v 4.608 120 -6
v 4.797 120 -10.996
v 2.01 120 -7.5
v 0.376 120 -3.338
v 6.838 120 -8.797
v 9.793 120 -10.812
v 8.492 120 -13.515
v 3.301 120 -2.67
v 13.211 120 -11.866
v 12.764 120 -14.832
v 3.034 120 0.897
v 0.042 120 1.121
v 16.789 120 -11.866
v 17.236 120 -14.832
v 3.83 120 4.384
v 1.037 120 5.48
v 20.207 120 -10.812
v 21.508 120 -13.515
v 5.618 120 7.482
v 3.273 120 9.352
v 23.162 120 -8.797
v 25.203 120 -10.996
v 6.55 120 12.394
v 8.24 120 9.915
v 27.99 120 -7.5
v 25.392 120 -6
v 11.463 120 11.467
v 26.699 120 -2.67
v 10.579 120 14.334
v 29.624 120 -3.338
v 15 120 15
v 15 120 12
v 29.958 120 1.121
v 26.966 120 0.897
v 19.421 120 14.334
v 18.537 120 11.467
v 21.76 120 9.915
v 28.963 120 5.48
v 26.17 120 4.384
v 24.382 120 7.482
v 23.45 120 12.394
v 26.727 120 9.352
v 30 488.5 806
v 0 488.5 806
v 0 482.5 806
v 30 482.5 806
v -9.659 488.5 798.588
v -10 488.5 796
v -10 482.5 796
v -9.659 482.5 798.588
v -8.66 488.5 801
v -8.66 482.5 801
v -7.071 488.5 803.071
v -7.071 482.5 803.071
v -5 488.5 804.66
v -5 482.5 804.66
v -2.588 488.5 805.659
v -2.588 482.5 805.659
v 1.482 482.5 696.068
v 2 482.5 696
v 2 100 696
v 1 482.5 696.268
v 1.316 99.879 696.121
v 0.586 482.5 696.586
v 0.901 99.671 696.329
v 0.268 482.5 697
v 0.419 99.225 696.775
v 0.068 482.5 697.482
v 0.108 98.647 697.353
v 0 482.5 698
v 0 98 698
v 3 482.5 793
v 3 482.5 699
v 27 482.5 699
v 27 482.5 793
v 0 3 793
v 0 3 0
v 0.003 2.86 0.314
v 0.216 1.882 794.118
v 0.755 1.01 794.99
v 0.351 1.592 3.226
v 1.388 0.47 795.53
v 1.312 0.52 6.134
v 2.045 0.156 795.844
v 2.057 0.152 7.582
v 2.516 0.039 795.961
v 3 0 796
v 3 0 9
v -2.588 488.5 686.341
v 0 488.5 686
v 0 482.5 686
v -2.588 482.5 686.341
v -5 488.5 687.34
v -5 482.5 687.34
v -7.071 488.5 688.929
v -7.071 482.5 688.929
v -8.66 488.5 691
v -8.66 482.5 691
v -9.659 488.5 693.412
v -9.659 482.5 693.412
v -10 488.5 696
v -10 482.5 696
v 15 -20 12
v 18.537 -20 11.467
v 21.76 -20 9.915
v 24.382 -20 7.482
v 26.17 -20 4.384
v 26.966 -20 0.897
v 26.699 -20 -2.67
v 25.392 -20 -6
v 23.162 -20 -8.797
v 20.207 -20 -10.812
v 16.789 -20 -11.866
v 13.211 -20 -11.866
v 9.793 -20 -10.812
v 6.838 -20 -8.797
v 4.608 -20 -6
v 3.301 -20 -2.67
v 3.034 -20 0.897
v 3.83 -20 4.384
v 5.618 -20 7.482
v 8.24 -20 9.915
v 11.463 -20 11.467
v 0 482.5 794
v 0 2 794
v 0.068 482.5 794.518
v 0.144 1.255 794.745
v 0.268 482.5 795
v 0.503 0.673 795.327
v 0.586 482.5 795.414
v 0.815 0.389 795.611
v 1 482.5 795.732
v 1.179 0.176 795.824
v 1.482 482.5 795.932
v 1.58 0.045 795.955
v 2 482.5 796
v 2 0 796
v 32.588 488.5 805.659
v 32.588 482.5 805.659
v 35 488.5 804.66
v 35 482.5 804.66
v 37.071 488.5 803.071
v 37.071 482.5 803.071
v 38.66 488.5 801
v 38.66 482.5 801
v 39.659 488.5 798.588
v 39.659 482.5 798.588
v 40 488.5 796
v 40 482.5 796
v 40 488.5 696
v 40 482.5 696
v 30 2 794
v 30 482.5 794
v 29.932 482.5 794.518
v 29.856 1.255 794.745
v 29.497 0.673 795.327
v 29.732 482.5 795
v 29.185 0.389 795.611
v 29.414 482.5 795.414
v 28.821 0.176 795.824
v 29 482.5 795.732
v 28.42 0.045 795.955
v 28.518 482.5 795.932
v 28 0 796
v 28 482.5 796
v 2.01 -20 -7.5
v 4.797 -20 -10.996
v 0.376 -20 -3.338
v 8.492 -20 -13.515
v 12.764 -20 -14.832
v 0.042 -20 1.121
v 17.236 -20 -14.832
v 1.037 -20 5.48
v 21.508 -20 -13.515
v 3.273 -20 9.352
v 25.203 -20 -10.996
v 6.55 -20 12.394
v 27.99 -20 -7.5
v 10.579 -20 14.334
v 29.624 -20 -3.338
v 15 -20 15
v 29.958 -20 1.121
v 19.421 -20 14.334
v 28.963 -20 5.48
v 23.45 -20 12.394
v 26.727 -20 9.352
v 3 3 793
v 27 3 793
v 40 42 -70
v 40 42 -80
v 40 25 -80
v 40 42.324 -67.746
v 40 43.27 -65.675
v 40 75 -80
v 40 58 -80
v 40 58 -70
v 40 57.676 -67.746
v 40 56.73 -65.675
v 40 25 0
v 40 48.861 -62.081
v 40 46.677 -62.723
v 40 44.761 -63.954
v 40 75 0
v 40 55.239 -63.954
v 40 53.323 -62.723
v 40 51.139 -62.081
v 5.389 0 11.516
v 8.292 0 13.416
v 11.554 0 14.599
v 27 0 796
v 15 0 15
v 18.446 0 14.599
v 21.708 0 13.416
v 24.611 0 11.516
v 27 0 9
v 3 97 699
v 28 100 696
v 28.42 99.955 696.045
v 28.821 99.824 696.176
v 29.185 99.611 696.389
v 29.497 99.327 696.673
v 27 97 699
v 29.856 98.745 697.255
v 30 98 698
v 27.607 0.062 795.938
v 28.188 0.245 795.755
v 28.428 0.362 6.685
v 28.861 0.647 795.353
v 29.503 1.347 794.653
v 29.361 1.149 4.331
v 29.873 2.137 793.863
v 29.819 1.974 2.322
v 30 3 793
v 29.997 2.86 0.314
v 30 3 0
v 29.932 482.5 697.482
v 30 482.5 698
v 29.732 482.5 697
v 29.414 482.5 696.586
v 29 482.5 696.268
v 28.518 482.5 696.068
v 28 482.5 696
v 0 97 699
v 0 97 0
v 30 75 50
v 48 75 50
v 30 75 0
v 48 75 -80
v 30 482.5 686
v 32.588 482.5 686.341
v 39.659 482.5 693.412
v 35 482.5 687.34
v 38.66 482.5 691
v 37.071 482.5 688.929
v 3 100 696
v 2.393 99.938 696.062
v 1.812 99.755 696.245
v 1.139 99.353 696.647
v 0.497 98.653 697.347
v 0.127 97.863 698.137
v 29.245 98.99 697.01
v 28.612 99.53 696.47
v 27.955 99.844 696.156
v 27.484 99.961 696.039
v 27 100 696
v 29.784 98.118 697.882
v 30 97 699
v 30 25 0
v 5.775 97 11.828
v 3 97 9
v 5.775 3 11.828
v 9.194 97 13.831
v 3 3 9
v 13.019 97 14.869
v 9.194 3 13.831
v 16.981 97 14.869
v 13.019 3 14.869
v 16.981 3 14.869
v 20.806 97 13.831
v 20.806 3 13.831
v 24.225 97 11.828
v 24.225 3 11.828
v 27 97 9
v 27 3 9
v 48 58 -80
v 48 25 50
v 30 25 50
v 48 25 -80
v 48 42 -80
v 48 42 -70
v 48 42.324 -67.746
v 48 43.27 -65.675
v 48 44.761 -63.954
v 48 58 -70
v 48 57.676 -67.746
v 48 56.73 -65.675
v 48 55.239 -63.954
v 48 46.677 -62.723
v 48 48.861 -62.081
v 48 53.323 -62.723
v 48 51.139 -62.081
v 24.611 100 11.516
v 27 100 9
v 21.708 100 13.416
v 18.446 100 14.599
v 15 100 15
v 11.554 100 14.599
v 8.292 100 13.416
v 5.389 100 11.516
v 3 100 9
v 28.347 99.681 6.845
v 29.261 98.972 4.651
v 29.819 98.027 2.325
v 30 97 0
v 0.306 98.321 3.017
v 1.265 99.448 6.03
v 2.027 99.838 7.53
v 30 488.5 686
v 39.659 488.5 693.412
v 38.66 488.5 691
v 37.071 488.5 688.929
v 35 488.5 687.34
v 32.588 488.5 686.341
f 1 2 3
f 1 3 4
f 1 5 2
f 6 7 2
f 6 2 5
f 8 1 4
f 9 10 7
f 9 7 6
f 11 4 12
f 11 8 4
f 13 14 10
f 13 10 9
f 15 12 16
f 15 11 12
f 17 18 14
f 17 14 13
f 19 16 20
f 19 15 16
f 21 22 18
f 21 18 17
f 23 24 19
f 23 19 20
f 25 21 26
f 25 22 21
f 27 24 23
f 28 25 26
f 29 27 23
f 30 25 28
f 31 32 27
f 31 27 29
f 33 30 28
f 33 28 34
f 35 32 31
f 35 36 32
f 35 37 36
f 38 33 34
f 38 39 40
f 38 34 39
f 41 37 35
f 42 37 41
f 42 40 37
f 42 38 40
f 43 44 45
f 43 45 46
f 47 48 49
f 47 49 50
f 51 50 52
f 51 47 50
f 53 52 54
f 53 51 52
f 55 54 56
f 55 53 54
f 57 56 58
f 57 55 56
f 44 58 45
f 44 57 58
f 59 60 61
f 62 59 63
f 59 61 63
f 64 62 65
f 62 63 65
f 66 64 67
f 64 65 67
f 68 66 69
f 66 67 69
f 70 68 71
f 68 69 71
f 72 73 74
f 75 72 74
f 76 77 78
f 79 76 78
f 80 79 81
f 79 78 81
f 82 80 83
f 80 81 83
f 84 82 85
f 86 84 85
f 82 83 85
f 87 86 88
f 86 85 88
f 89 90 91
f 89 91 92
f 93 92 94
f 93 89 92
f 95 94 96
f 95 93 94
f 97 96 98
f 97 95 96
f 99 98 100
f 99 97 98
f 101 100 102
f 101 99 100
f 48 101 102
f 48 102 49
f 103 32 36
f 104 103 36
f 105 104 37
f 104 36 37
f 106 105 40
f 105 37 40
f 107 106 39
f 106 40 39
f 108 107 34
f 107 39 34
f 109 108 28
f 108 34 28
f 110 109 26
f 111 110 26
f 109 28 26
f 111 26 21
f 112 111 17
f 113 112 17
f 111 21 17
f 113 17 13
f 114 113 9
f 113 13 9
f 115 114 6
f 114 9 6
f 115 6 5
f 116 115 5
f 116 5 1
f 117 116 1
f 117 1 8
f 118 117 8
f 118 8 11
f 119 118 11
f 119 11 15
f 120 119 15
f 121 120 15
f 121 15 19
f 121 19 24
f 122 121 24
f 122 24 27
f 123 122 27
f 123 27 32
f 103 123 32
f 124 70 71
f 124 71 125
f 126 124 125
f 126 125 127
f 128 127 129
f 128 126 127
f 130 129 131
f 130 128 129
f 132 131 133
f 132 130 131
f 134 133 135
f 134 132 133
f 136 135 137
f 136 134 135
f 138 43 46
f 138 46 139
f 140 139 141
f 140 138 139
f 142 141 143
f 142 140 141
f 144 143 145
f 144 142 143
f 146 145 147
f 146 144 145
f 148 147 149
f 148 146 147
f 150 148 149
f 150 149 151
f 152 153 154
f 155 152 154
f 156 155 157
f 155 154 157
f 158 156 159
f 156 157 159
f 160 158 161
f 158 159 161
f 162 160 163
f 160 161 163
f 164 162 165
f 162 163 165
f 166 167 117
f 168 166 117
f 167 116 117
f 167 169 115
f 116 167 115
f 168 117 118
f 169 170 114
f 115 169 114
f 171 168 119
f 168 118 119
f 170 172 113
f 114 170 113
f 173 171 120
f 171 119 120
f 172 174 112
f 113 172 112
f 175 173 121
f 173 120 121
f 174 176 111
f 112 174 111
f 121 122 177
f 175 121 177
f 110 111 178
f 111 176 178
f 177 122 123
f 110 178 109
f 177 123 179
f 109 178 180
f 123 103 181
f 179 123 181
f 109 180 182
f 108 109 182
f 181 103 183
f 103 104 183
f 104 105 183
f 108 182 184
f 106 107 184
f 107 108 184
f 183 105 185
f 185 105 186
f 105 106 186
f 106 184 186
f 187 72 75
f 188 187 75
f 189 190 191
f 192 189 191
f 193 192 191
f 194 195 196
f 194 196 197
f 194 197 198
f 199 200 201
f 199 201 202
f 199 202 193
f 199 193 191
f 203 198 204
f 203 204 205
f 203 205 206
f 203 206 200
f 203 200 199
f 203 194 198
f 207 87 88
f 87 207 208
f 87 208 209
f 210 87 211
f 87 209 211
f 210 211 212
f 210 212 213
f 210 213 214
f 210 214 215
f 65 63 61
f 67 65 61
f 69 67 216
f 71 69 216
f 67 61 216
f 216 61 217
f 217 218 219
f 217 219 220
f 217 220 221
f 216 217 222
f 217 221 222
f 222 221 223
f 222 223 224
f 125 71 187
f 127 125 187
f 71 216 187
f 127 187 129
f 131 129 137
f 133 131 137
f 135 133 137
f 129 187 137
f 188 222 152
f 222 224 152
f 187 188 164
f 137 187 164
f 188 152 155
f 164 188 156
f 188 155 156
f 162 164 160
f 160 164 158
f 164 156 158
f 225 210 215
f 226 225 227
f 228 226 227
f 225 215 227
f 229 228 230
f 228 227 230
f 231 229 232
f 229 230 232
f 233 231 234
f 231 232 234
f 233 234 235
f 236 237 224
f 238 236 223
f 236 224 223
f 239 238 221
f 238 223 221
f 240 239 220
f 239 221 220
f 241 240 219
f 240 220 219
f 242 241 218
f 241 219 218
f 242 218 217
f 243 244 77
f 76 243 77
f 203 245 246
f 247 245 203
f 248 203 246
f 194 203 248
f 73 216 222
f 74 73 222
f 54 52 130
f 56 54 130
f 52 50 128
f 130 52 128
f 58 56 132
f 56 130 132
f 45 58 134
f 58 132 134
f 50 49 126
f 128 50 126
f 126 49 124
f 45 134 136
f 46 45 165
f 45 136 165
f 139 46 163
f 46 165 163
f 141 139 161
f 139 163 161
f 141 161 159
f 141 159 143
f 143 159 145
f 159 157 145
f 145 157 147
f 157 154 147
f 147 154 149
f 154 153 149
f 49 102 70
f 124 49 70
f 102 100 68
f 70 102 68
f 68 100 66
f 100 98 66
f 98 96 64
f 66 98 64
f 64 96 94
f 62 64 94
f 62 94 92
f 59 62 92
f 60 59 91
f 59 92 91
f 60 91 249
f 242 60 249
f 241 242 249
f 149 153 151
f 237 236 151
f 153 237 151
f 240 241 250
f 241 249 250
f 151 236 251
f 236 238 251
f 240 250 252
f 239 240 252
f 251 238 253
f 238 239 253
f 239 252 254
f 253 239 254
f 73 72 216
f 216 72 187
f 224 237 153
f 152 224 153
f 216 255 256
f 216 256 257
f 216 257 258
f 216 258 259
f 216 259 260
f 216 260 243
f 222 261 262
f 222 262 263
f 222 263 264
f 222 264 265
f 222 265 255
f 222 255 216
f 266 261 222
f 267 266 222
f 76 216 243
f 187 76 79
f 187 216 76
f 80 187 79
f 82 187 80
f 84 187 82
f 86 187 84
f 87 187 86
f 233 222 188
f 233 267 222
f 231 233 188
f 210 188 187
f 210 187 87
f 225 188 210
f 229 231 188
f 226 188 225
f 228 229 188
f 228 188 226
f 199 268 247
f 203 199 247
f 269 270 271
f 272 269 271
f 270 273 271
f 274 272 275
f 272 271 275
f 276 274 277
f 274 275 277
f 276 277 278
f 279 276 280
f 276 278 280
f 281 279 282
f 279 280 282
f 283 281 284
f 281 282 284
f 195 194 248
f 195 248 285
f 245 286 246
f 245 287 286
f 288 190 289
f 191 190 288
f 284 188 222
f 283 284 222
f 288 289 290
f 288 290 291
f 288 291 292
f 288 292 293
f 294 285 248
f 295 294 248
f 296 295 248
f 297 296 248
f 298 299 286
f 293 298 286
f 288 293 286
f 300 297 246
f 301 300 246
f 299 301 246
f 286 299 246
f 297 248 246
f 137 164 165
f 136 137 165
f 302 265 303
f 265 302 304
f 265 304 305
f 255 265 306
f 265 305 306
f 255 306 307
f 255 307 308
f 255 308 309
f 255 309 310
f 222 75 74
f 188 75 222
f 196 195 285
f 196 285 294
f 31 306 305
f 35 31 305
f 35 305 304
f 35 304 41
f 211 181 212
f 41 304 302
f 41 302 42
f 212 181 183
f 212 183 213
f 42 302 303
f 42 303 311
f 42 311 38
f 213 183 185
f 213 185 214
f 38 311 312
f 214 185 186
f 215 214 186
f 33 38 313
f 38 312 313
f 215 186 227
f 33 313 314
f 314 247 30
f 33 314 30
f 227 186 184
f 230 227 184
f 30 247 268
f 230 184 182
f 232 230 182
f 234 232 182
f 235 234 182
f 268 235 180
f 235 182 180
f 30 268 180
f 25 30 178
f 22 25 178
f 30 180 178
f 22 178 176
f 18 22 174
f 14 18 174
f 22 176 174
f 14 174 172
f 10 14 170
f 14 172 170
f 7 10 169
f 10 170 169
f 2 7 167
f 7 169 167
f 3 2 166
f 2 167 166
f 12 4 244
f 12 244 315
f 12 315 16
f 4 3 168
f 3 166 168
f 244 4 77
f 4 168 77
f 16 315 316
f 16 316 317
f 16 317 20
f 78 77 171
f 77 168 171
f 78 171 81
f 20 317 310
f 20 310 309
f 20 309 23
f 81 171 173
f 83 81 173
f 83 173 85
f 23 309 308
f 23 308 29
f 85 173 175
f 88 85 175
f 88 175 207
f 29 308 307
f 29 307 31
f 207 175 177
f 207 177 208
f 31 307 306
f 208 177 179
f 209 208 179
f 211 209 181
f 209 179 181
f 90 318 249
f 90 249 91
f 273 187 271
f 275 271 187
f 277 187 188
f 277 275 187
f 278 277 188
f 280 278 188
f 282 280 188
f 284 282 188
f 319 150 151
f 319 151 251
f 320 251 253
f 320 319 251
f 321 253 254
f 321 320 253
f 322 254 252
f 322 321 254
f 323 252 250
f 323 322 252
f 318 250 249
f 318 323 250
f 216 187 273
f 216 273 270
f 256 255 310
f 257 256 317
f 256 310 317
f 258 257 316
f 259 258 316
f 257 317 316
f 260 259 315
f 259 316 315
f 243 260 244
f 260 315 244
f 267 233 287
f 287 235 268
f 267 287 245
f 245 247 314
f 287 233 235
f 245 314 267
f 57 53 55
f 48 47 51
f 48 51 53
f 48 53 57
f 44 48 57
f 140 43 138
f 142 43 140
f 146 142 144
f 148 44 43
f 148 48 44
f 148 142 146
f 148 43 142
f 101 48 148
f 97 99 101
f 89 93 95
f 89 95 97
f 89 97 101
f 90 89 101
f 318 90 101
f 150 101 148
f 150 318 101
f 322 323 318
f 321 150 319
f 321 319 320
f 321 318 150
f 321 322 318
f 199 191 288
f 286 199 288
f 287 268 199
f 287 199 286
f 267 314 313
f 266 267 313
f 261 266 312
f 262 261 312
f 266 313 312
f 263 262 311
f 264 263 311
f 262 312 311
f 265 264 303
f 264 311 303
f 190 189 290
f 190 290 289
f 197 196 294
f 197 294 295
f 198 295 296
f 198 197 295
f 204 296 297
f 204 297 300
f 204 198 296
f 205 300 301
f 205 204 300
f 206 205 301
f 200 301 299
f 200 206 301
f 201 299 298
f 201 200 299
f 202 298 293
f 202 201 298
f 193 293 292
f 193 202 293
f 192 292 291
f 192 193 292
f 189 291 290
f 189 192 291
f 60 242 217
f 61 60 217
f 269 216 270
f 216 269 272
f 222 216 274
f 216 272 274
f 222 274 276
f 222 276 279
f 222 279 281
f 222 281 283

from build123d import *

# Parameters (mm, degrees)
SCHIZZO1_W                        = 24
SCHIZZO1_H                        = 94
ESTRUSIONE_SOTTILE1_DEPTH         = 796
TAGLIO_ESTRUSIONE1_DEPTH          = 803.817538423
ESTRUSIONE_ESTRUSIONE1_DEPTH      = 20
ESTRUSIONE_ESTRUSIONE1_DEPTH_BACK = 120
SCHIZZO3_R                        = 15
SCHIZZO4_R                        = 12
TAGLIO_ESTRUSIONE2_DEPTH          = 809.774381514
SCHIZZO5_W                        = 50
SCHIZZO5_H                        = 50
ESTRUSIONE_ESTRUSIONE2_DEPTH      = 10
ESTRUSIONE_ESTRUSIONE3_DEPTH      = 8
ESTRUSIONE_ESTRUSIONE4_DEPTH      = 15
RACCORDO1_R                       = 2
TAGLIO_ESTRUSIONE3_DEPTH          = 946.776004274
TAGLIO_ESTRUSIONE3_DEPTH_BACK     = 946.776004274
SCHIZZO8_W                        = 24
SCHIZZO8_H                        = 94
ESTRUSIONE_ESTRUSIONE5_DEPTH      = 6


with BuildPart() as part:
    # Schizzo1 → Estrusione-Sottile1 (new body)
    with BuildSketch(Plane.XY):
        with BuildLine():
            Line((0, 97), (0, 3))
            ThreePointArc((0, 3), (0.878679656, 0.878679656), (3, 0))
            Line((3, 0), (27, 0))
            ThreePointArc((27, 0), (29.121320344, 0.878679656), (30, 3))
            Line((30, 3), (30, 97))
            ThreePointArc((30, 97), (29.121320344, 99.121320344), (27, 100))
            Line((27, 100), (3, 100))
            ThreePointArc((3, 100), (0.878679656, 99.121320344), (0, 97))
        make_face()
        with Locations((15, 50)):
            Rectangle(SCHIZZO1_W, SCHIZZO1_H, mode=Mode.SUBTRACT)
    extrude(amount=ESTRUSIONE_SOTTILE1_DEPTH)

    # Schizzo2 → Taglio-Estrusione1 (cut, through all)
    with BuildSketch(Plane(origin=(30, 0, 0), x_dir=(0, 0, -1), z_dir=(1, 0, 0))):
        Polygon((-796, 100), (-696, 100), (-796, 0), align=None)
    extrude(amount=-TAGLIO_ESTRUSIONE1_DEPTH, mode=Mode.SUBTRACT)

    # Schizzo3 → Estrusione-Estrusione1 (add, two sides: drawn at the far end of the back side and taken through both)
    with BuildSketch(Plane(origin=(0, 100, 0), x_dir=(1, 0, 0), z_dir=(0, 1, 0)).offset(-ESTRUSIONE_ESTRUSIONE1_DEPTH_BACK)):
        with Locations(Location((15, 0, 0), (0, 0, 270))):
            Circle(SCHIZZO3_R)
    extrude(amount=ESTRUSIONE_ESTRUSIONE1_DEPTH + ESTRUSIONE_ESTRUSIONE1_DEPTH_BACK)

    # Schizzo4 → Taglio-Estrusione2 (cut, through all)
    with BuildSketch(Plane(origin=(0, 120, 0), x_dir=(1, 0, 0), z_dir=(0, 1, 0))):
        with Locations(Location((15, 0, 0), (0, 0, 270))):
            Circle(SCHIZZO4_R)
    extrude(amount=-TAGLIO_ESTRUSIONE2_DEPTH, mode=Mode.SUBTRACT)

    # Schizzo5 → Estrusione-Estrusione2 (add)
    with BuildSketch(Plane(origin=(30, 0, 0), x_dir=(0, 0, -1), z_dir=(1, 0, 0))):
        with Locations((-25, 50)):
            Rectangle(SCHIZZO5_W, SCHIZZO5_H)
    extrude(amount=ESTRUSIONE_ESTRUSIONE2_DEPTH)

    # Schizzo6 → Estrusione-Estrusione3 (add)
    with BuildSketch(Plane(origin=(40, 0, 0), x_dir=(0, 0, -1), z_dir=(1, 0, 0))):
        with BuildLine():
            Line((-50, 75), (80, 75))
            Line((80, 75), (80, 58))
            Line((80, 58), (70, 58))
            ThreePointArc((70, 58), (62, 50), (70, 42))
            Line((70, 42), (80, 42))
            Line((80, 42), (80, 25))
            Line((80, 25), (-50, 25))
            Line((-50, 25), (-50, 75))
        make_face()
    extrude(amount=ESTRUSIONE_ESTRUSIONE3_DEPTH)


with BuildPart() as body_2:
    # Schizzo7 → Estrusione-Estrusione4 (new, symmetric)
    with BuildSketch(Plane(origin=(15, 0, 0), x_dir=(0, 0, -1), z_dir=(1, 0, 0))):
        Polygon((-796, 488.5), (-696, 488.5), (-696, 100), (-796, 0), align=None)
    extrude(amount=ESTRUSIONE_ESTRUSIONE4_DEPTH, both=True)

    # Raccordo1
    raccordo1_edges = [body_2.edges().sort_by_distance(p)[0] for p in [
        (30, 244.25, 796),
        (0, 244.25, 796),
        (0, 294.25, 696),
        (30, 294.25, 696),
    ]]
    fillet(raccordo1_edges, radius=RACCORDO1_R)

    # Schizzo8 → Taglio-Estrusione3 (cut, two sides: drawn at the far end of the back side and taken through both)
    with BuildSketch(Plane(origin=(0, 488.5, 0), x_dir=(1, 0, 0), z_dir=(0, 1, 0)).offset(-TAGLIO_ESTRUSIONE3_DEPTH_BACK)):
        with Locations((15, -746)):
            Rectangle(SCHIZZO8_W, SCHIZZO8_H)
    extrude(amount=TAGLIO_ESTRUSIONE3_DEPTH + TAGLIO_ESTRUSIONE3_DEPTH_BACK, mode=Mode.SUBTRACT)

    # Schizzo9 → Estrusione-Estrusione5 (add)
    with BuildSketch(Plane(origin=(0, 488.5, 0), x_dir=(1, 0, 0), z_dir=(0, 1, 0))):
        with BuildLine():
            Line((0, -806), (30, -806))
            ThreePointArc((30, -806), (37.071067812, -803.071067812), (40, -796))
            Line((40, -796), (40, -696))
            ThreePointArc((40, -696), (37.071067812, -688.928932188), (30, -686))
            Line((30, -686), (0, -686))
            ThreePointArc((0, -686), (-7.071067812, -688.928932188), (-10, -696))
            Line((-10, -696), (-10, -796))
            ThreePointArc((-10, -796), (-7.071067812, -803.071067812), (0, -806))
        make_face()
    extrude(amount=-ESTRUSIONE_ESTRUSIONE5_DEPTH)


solid = Compound([part.part, body_2.part])
